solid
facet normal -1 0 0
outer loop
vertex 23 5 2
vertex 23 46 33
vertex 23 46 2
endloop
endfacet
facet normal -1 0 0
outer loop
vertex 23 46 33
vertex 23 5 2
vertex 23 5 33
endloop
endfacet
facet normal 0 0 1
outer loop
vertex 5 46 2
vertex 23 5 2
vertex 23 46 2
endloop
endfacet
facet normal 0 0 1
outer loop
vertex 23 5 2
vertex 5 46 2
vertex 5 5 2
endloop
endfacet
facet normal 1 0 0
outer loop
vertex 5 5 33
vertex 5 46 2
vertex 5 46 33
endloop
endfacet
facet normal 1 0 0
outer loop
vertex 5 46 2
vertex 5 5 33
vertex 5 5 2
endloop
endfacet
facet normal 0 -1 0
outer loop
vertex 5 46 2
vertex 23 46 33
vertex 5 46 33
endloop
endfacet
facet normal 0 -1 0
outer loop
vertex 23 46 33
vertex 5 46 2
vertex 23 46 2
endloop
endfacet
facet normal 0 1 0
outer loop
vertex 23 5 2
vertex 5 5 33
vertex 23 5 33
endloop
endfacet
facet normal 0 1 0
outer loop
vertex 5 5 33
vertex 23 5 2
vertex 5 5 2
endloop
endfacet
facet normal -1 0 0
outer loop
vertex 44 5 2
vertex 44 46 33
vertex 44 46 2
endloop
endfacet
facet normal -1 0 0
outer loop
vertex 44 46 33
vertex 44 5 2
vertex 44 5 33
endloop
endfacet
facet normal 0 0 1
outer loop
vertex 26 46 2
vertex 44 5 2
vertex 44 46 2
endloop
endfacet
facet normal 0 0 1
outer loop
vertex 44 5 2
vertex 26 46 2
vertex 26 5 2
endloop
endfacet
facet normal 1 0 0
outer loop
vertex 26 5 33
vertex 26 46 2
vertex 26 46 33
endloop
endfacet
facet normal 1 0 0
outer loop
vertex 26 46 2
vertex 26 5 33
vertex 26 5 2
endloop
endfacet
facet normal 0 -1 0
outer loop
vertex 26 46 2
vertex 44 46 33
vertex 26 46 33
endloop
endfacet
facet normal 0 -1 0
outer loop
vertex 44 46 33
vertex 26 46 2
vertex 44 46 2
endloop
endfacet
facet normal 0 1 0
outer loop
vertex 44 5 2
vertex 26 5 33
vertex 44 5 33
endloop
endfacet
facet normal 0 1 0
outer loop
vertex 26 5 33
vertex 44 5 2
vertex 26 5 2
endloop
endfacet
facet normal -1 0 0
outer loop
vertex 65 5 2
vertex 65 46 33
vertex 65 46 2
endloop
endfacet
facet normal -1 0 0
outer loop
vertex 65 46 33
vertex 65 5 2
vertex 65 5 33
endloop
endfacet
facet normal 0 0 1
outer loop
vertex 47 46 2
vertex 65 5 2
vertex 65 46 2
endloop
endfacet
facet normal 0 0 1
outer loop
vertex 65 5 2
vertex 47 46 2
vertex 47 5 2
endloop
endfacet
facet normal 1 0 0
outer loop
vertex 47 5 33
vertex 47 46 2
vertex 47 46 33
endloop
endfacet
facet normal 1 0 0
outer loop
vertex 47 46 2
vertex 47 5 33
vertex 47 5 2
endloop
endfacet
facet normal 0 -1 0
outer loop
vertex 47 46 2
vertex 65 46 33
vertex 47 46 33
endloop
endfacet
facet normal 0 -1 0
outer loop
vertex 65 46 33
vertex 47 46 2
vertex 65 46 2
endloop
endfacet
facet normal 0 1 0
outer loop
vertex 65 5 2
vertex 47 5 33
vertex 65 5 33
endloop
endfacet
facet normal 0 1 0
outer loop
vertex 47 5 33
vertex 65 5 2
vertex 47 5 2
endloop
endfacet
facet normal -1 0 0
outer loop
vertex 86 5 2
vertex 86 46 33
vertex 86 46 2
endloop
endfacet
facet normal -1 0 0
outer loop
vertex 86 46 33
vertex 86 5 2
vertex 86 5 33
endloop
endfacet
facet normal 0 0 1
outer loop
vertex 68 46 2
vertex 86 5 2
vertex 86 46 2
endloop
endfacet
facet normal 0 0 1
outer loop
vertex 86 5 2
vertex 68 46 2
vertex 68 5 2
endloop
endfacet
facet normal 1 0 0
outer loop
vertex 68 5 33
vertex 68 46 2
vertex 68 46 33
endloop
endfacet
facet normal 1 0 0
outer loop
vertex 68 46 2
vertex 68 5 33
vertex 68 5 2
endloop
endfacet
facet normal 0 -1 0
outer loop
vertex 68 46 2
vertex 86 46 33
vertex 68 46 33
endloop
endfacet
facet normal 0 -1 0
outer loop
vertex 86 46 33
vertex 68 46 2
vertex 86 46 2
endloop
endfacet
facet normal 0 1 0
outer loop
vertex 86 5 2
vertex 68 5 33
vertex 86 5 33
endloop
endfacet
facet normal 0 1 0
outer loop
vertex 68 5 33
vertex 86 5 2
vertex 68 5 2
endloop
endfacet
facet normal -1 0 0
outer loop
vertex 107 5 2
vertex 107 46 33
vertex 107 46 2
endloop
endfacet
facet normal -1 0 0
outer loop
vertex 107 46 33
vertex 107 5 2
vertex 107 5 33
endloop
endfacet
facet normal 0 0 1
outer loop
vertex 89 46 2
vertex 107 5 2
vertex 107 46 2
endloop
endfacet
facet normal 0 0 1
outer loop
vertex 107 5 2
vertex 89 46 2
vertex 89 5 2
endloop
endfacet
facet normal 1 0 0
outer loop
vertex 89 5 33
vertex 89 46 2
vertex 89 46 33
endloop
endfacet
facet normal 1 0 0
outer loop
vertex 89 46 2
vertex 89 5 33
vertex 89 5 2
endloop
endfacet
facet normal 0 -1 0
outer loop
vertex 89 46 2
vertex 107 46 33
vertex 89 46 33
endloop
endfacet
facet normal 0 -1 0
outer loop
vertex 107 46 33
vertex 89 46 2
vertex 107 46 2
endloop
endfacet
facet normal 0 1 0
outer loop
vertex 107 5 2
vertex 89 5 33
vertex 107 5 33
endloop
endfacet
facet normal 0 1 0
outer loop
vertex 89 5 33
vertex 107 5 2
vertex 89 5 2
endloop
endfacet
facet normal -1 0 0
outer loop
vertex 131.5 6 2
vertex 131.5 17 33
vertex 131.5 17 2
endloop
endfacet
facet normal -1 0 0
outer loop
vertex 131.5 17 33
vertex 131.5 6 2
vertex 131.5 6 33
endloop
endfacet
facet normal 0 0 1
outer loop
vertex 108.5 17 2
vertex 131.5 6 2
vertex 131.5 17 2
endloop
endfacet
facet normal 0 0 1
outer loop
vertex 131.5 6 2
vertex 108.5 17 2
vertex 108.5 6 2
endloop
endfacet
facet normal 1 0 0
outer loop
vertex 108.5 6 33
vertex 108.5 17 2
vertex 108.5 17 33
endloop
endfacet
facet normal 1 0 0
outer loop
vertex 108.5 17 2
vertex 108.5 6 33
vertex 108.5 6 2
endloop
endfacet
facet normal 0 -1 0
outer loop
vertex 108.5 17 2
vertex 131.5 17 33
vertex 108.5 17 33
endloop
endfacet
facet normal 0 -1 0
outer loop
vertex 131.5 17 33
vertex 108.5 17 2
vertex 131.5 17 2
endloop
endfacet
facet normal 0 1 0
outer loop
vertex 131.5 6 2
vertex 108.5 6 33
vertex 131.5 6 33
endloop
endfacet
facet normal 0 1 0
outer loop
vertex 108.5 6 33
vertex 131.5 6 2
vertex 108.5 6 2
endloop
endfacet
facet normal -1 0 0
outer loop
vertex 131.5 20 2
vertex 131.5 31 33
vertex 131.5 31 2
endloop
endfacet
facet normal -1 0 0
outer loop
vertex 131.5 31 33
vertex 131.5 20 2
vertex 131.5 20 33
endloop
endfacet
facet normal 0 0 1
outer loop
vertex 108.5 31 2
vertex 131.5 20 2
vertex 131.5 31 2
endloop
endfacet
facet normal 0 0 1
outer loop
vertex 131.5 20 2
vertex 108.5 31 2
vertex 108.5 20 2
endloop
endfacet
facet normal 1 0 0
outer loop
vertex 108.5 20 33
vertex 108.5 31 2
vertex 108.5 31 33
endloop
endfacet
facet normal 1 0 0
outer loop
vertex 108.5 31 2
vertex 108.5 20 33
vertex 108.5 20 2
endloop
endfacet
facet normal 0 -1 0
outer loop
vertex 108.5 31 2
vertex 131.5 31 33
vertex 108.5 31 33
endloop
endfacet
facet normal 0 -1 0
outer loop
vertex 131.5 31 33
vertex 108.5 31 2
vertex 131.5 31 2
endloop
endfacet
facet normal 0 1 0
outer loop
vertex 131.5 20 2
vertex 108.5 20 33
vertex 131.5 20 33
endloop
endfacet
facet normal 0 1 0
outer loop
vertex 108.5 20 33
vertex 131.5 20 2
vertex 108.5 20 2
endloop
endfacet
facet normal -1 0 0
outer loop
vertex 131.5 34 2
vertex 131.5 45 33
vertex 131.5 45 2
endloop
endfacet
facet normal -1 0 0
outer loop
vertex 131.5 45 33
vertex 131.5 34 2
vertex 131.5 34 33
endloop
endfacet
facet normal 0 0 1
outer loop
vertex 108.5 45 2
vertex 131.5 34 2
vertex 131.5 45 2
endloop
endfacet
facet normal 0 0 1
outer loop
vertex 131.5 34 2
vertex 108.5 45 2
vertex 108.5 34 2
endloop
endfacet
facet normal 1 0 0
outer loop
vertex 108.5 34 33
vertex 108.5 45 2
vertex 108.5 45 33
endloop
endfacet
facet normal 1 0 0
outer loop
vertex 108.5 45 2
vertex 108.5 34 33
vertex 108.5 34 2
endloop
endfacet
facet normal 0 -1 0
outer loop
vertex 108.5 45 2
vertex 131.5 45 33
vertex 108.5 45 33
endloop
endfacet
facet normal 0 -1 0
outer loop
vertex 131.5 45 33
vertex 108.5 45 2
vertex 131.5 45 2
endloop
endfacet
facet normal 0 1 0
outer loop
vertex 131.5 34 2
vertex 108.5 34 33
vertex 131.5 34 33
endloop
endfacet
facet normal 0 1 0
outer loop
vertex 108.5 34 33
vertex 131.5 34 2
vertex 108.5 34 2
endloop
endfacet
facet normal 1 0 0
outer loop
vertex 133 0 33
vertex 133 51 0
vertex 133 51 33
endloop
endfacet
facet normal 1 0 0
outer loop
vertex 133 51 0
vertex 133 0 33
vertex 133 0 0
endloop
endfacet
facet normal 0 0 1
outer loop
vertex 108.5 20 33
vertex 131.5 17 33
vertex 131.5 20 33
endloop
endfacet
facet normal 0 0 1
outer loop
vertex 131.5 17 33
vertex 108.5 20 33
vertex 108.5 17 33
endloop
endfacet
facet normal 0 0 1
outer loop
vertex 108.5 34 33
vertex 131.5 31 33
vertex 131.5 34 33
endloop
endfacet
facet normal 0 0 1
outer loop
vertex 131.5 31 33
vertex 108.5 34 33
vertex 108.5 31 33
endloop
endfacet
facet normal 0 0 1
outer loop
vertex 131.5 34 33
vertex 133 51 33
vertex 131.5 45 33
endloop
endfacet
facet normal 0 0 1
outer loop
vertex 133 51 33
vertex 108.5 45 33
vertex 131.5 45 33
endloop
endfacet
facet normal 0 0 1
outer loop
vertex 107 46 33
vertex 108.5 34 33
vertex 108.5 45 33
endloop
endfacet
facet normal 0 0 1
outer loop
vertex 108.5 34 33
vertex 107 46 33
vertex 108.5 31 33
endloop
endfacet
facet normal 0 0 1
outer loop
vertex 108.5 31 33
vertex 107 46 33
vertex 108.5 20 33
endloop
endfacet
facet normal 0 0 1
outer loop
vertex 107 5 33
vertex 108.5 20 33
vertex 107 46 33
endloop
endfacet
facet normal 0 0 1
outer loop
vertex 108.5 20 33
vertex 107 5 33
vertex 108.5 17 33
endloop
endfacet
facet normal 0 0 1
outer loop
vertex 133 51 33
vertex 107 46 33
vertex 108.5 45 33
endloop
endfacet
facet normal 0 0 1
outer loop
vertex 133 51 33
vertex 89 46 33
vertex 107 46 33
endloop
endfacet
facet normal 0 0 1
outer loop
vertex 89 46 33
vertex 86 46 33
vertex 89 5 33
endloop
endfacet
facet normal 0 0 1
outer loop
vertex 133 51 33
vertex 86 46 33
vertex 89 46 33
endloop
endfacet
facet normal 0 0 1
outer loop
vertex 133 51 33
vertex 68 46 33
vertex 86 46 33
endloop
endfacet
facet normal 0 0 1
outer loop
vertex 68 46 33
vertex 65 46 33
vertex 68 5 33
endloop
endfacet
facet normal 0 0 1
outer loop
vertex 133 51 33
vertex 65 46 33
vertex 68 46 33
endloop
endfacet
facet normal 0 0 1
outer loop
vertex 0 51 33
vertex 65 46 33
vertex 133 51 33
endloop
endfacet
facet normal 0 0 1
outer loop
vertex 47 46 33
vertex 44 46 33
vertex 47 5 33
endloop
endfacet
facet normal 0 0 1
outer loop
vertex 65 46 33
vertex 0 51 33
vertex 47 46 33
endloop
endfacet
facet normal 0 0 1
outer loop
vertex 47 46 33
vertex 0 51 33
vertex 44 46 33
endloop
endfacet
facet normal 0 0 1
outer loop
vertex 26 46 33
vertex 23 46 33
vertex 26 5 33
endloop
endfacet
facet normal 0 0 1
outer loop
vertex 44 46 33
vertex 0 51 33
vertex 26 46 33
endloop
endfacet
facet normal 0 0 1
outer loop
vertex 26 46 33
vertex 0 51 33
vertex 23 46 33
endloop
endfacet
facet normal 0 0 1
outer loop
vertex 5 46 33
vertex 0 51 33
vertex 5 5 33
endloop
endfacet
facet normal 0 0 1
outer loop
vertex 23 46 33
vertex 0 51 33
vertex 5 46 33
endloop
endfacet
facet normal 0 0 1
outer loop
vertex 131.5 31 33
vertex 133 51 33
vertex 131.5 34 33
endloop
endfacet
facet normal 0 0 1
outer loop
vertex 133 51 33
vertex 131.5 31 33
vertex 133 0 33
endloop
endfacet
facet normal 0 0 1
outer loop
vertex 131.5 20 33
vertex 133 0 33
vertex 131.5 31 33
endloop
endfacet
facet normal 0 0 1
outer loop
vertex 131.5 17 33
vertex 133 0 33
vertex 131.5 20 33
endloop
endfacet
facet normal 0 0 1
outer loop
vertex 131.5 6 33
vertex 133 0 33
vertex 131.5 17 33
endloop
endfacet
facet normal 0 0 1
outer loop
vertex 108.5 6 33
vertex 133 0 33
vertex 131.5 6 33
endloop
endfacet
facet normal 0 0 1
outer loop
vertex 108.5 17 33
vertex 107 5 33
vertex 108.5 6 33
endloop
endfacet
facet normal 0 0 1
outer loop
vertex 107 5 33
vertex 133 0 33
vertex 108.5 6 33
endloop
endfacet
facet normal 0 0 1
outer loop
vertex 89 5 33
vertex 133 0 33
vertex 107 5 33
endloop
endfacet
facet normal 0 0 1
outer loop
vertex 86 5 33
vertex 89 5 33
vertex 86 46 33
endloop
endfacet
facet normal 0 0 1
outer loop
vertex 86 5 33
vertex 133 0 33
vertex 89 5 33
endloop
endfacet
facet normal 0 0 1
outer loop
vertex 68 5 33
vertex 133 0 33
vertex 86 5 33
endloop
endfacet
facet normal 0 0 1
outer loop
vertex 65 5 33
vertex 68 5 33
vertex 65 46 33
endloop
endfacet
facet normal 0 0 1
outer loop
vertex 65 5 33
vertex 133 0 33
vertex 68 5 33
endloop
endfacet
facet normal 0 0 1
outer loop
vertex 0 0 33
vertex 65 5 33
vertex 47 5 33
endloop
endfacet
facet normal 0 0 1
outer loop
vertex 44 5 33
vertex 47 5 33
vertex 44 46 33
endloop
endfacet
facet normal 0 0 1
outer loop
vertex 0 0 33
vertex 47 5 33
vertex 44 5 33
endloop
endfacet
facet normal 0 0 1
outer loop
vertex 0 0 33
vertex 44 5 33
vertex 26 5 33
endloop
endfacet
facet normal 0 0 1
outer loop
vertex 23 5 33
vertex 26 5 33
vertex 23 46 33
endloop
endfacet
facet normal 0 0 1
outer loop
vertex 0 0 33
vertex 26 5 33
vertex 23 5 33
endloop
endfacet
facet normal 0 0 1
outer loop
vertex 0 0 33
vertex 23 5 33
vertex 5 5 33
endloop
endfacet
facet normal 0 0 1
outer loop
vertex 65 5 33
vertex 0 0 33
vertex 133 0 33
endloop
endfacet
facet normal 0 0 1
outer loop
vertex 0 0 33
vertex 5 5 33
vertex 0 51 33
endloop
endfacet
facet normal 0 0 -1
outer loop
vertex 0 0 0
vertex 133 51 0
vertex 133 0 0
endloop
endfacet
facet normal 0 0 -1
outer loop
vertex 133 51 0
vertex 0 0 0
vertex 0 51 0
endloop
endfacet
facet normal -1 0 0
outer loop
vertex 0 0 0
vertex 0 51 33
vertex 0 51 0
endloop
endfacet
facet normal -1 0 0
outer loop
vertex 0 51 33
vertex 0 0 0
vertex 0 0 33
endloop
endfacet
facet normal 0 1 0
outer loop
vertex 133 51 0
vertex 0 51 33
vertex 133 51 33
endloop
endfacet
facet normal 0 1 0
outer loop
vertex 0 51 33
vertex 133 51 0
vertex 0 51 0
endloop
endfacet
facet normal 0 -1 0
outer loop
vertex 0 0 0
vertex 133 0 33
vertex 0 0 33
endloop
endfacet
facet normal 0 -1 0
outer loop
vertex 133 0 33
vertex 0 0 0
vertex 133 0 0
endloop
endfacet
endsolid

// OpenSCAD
// Parameterized insert organizer
// Big inserts (18 x 41 x 31) arranged in a row, plus a perpendicular column
// of small inserts (23 x 11 x 31) replacing what would have been a 6th big
// insert on the right end.

// ---- Big insert parameters ----
big_insert_x = 18;   // big insert width  (X, short side)
big_insert_y = 41;   // big insert depth  (Y, long side)
big_insert_z = 31;   // big insert height (Z, cut depth)
num_big      = 5;    // how many big inserts in the row

// ---- Small insert parameters (perpendicular orientation) ----
small_insert_x = 23; // small insert long side, along X (perpendicular to big inserts)
small_insert_y = 11; // small insert short side, along Y
small_insert_z = 31;

// ---- Shared parameters ----
internal_gap    = 3; // nominal wall thickness between adjacent inserts
border          = 5; // nominal wall thickness around the outside
floor_thickness = 2; // solid floor below the inserts

$fn = 64;

// ---- Outer box: same envelope as if 6 big inserts were in a row ----
nominal_slots = num_big + 1;
outer_x = 2 * border
        + nominal_slots * big_insert_x
        + (nominal_slots - 1) * internal_gap;
outer_y = 2 * border + big_insert_y;
outer_z = floor_thickness + big_insert_z;

// ---- Small insert column placement ----
// Width available from the right face of the last big insert to the outer right face.
last_big_end_x    = border + num_big * big_insert_x + (num_big - 1) * internal_gap;
small_region_w    = outer_x - last_big_end_x;
small_x_slack     = small_region_w - small_insert_x;          // leftover after the 23 mm insert
small_left_wall   = small_x_slack / 2;                         // split slack evenly between
small_right_wall  = small_x_slack - small_left_wall;           // left wall and right wall
small_x_origin    = last_big_end_x + small_left_wall;

// How many small inserts fit stacked along Y inside the big-insert Y window,
// using the standard internal_gap between them.
num_small         = floor((big_insert_y + internal_gap) / (small_insert_y + internal_gap));
small_stack_y     = num_small * small_insert_y + (num_small - 1) * internal_gap;
small_y_offset    = (big_insert_y - small_stack_y) / 2;        // center the stack in Y

module insert_organizer() {
    difference() {
        cube([outer_x, outer_y, outer_z]);

        // Big inserts (long axis along Y)
        for (i = [0 : num_big - 1]) {
            translate([
                border + i * (big_insert_x + internal_gap),
                border,
                floor_thickness
            ])
            cube([big_insert_x, big_insert_y, big_insert_z + 1]);
        }

        // Small inserts (long axis along X, stacked along Y)
        for (j = [0 : num_small - 1]) {
            translate([
                small_x_origin,
                border + small_y_offset + j * (small_insert_y + internal_gap),
                floor_thickness
            ])
            cube([small_insert_x, small_insert_y, small_insert_z + 1]);
        }
    }
}

insert_organizer();

echo(str("Outer: ", outer_x, " x ", outer_y, " x ", outer_z, " mm"));
echo(str("Small inserts fit: ", num_small));
echo(str("Small section walls: left=", small_left_wall,
         " mm, right=", small_right_wall, " mm"));
